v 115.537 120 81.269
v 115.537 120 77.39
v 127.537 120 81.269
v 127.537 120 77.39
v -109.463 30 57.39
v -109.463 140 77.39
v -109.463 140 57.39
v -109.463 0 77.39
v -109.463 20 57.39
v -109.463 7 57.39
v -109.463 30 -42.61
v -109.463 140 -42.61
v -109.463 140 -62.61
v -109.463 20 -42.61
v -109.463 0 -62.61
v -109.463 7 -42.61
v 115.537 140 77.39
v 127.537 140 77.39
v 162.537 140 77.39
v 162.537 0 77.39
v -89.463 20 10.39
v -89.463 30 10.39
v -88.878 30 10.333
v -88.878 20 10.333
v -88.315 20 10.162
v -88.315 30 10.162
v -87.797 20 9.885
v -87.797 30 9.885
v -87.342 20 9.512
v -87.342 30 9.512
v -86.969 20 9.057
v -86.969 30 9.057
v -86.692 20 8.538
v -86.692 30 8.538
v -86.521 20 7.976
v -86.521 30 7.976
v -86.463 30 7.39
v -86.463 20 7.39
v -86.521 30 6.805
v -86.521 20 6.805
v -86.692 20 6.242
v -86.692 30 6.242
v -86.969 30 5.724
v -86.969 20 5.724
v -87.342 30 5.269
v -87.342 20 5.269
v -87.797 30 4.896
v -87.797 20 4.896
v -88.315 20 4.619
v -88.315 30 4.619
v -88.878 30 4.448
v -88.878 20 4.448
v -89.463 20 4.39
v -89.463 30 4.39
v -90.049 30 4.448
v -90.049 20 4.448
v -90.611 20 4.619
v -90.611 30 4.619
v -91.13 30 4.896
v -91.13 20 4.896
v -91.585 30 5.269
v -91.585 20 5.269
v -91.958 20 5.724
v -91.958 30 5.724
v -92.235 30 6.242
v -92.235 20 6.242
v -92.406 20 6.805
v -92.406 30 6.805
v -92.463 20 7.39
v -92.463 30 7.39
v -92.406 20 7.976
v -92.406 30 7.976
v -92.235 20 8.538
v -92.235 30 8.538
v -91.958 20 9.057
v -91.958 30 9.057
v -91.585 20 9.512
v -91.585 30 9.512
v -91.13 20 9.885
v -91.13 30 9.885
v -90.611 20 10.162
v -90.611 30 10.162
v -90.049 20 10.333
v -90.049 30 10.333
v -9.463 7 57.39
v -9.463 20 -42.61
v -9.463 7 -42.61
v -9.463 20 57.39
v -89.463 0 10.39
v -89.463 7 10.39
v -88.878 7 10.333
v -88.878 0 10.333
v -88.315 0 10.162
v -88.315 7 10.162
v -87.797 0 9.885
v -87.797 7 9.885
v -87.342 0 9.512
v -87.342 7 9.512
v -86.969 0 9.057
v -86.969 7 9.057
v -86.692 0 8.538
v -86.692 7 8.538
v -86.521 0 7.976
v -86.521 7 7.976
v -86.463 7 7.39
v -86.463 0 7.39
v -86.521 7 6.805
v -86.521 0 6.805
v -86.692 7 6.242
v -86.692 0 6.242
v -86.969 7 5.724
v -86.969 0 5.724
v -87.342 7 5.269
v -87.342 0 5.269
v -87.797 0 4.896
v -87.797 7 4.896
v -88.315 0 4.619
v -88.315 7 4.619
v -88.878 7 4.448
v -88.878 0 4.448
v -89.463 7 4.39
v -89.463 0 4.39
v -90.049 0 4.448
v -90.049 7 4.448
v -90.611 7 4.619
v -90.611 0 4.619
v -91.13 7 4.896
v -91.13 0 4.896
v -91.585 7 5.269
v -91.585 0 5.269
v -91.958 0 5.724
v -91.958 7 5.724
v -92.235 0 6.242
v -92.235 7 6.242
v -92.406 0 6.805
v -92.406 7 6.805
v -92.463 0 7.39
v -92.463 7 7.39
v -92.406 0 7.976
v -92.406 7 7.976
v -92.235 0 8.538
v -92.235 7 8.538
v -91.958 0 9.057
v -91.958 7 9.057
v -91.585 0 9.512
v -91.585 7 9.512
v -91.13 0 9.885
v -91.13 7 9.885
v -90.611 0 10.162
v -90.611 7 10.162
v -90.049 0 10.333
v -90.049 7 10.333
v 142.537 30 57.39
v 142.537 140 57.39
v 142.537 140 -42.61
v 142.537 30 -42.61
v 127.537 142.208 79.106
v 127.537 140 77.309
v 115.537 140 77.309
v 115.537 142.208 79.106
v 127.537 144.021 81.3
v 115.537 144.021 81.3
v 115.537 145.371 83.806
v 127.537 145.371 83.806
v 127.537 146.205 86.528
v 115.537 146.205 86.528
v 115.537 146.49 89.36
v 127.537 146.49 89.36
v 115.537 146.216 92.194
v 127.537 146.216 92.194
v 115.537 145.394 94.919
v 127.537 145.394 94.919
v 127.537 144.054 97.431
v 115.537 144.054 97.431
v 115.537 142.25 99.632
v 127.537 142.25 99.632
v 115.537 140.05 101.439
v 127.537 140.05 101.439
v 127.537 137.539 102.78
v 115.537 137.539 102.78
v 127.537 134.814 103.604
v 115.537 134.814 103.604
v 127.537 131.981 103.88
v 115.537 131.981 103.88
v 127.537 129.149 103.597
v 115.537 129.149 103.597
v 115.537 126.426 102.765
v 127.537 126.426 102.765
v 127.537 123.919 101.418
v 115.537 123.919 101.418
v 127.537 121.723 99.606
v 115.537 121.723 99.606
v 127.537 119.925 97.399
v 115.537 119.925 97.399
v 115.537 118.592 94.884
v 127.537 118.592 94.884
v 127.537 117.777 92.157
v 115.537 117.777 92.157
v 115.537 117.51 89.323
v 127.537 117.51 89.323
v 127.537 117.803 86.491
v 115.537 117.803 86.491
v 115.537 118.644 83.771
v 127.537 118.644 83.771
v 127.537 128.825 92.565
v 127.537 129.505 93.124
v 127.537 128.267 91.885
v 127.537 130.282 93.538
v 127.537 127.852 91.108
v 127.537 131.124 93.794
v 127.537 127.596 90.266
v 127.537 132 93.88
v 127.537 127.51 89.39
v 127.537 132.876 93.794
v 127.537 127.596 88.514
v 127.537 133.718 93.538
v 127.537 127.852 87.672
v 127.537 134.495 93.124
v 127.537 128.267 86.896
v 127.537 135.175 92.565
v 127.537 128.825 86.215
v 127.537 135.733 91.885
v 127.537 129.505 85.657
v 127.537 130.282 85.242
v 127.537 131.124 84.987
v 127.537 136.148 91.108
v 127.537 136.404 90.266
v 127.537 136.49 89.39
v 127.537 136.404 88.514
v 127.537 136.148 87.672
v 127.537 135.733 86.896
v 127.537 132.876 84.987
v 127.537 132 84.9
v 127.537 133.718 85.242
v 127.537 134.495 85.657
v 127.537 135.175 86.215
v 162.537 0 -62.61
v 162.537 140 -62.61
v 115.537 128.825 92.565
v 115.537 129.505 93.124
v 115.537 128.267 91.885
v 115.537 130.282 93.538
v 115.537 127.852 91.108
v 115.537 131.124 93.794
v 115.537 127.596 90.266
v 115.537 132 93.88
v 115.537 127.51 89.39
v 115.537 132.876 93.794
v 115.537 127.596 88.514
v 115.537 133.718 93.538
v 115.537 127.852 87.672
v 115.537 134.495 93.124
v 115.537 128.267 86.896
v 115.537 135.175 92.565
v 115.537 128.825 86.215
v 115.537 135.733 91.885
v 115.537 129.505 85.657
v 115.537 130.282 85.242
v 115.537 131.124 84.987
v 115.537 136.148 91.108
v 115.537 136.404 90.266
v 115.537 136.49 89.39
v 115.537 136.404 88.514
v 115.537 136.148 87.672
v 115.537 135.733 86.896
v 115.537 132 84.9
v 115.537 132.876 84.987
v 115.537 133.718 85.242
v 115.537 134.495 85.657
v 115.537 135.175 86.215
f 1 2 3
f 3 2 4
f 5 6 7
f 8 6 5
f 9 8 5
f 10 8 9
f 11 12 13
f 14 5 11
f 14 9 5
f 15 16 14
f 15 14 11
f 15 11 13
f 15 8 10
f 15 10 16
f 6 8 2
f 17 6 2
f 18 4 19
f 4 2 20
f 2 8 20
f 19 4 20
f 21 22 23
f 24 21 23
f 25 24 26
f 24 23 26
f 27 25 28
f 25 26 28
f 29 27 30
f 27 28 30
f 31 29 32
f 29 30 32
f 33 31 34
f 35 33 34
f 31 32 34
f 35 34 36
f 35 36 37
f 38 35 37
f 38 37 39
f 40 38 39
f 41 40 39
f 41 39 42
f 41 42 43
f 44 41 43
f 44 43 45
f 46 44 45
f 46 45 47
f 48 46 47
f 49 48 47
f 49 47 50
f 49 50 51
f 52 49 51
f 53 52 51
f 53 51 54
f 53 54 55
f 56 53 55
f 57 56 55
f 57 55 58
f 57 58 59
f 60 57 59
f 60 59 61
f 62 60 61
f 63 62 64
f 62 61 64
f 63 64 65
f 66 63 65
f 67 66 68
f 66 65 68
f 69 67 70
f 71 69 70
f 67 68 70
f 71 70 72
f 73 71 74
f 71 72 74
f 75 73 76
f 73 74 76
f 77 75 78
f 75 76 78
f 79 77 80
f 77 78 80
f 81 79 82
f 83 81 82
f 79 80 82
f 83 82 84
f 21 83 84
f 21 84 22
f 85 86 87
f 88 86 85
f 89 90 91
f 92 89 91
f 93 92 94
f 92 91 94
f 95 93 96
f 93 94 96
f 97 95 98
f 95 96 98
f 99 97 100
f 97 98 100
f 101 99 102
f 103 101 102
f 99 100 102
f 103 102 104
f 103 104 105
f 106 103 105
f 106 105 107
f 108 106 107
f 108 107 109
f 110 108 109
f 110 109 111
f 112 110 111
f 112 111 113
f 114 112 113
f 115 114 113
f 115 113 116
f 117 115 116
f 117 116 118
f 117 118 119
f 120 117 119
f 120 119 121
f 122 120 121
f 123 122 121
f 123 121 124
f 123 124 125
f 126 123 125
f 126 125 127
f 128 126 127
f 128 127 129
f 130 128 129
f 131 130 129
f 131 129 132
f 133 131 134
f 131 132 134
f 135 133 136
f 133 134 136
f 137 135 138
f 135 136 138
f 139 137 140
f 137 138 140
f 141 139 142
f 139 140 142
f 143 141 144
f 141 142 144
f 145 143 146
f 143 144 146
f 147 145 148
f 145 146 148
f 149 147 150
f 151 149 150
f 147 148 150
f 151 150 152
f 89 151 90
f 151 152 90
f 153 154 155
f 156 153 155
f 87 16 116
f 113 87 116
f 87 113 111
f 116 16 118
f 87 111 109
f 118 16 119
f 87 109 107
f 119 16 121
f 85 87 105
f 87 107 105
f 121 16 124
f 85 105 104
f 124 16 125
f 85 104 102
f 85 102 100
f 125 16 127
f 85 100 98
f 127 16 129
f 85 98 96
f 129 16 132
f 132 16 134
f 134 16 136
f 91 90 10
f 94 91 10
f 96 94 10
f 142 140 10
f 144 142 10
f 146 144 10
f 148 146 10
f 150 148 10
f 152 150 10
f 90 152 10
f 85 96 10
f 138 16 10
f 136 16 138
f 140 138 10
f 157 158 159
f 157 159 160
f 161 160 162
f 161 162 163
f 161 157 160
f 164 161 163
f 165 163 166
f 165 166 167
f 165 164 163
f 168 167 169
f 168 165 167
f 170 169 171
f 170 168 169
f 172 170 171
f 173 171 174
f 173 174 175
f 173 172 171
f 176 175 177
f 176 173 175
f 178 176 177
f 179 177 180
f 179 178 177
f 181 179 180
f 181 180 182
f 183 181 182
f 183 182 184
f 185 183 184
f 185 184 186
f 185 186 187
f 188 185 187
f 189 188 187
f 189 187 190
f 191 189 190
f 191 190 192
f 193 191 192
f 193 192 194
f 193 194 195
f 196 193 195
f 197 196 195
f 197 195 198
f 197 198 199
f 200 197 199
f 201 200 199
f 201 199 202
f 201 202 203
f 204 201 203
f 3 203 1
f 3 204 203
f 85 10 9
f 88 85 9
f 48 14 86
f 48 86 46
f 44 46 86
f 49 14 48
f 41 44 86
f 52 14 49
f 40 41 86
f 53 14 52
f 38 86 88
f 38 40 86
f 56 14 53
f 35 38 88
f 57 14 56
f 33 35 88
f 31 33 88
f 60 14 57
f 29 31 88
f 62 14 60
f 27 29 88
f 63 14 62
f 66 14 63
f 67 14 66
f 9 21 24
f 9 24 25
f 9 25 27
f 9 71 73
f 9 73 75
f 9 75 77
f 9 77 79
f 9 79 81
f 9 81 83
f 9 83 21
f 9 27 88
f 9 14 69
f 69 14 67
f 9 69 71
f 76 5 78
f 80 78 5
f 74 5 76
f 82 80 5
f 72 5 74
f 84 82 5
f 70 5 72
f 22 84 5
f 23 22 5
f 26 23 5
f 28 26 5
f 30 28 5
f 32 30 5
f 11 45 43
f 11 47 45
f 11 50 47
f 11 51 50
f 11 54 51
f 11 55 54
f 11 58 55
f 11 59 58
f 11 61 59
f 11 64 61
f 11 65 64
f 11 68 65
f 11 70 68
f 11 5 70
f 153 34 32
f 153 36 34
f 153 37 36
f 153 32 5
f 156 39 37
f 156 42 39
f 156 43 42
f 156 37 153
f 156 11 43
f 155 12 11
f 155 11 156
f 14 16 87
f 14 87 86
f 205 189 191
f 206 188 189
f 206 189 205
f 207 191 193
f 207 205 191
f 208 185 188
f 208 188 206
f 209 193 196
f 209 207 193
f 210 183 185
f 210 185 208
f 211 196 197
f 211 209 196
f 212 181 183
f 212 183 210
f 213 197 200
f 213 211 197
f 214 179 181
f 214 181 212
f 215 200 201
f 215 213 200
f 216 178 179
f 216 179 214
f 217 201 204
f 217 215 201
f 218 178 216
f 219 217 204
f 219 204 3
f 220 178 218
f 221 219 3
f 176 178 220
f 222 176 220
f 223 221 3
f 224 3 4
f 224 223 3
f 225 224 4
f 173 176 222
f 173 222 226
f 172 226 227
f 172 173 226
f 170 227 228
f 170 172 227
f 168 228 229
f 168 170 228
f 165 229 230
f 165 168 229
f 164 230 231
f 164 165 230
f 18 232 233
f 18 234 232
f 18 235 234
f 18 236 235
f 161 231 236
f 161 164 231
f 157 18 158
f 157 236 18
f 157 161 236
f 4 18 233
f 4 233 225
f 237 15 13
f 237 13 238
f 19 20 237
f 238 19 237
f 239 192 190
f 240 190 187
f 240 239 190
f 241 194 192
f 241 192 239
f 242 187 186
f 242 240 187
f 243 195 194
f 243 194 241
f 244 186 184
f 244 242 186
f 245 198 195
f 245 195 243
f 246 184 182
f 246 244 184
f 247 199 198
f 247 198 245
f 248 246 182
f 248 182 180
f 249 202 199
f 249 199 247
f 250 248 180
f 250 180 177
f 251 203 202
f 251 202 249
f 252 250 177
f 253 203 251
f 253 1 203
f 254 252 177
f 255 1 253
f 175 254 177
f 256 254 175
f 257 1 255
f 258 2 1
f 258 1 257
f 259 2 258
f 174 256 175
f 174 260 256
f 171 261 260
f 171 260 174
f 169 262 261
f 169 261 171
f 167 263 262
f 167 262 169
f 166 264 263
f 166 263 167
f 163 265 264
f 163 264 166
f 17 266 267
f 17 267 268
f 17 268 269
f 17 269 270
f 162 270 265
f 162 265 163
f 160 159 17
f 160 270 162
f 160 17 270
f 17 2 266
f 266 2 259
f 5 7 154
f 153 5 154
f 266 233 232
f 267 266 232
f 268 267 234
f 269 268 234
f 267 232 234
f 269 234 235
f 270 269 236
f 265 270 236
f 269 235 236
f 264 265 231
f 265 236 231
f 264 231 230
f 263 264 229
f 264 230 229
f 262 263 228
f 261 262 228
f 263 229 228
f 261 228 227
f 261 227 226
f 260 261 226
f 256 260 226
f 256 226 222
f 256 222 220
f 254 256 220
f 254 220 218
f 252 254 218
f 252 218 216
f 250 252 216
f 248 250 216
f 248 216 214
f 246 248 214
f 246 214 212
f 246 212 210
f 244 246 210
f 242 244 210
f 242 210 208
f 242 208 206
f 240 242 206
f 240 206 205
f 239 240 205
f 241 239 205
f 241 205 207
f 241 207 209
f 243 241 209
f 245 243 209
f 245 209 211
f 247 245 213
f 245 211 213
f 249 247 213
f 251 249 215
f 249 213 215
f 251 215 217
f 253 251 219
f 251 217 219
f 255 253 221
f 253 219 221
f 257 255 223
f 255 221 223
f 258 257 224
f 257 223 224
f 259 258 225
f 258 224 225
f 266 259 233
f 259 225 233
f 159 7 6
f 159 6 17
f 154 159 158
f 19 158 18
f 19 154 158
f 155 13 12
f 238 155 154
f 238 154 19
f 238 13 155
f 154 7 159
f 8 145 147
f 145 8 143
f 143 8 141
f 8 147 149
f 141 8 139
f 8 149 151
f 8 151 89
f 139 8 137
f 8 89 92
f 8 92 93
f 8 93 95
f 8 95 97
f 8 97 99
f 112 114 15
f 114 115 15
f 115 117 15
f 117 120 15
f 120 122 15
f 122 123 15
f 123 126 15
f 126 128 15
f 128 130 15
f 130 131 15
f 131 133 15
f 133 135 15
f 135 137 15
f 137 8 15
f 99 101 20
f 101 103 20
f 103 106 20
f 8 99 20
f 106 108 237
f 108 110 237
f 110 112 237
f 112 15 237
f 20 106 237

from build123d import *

# Parameters (mm, degrees)
SKETCH_1_W          = 272
SKETCH_1_H          = 140
EXTRUDE_1_DEPTH     = 140
SKETCH_2_W          = 252
SKETCH_2_H          = 100
CUT_EXTRUDE_1_DEPTH = 110
SKETCH_3_W          = 100
SKETCH_3_H          = 13
CUT_EXTRUDE_2_DEPTH = 100
SKETCH_7_R          = 3
CUT_EXTRUDE_3_DEPTH = 211.967749748
SKETCH_8_W          = 12
SKETCH_8_H          = 12
EXTRUDE_2_DEPTH     = 10
SKETCH_9_R          = 14.49
SKETCH_9_R_2        = 4.49
EXTRUDE_1_2_DEPTH   = 12
SKETCH_11_R         = 4.49
CUT_EXTRUDE_5_DEPTH = 298.354040116


with BuildPart() as part:
    # 草圖1 → Extrude 1 (new body)
    with BuildSketch(Plane(origin=(0, 0, 0), x_dir=(1, 0, 0), z_dir=(0, 1, 0))):
        with Locations((26.536585366, -7.390243902)):
            Rectangle(SKETCH_1_W, SKETCH_1_H)
    extrude(amount=EXTRUDE_1_DEPTH)

    # 草圖2 → 除料-伸長1 (cut)
    with BuildSketch(Plane(origin=(0, 140, 0), x_dir=(1, 0, 0), z_dir=(0, 1, 0))):
        with Locations((16.536585366, -7.390243902)):
            Rectangle(SKETCH_2_W, SKETCH_2_H)
    extrude(amount=-CUT_EXTRUDE_1_DEPTH, mode=Mode.SUBTRACT)

    # 草圖3 → 除料-伸長2 (cut)
    with BuildSketch(Plane.ZY.offset(109.463414634)):
        with Locations((7.390243902, 13.5)):
            Rectangle(SKETCH_3_W, SKETCH_3_H)
    extrude(amount=-CUT_EXTRUDE_2_DEPTH, mode=Mode.SUBTRACT)

    # 草圖7 → 除料-伸長3 (cut, through all)
    with BuildSketch(Plane(origin=(0, 30, 0), x_dir=(1, 0, 0), z_dir=(0, 1, 0))):
        with Locations(Location((-89.463414634, -7.390243902, 0), (0, 0, 270))):
            Circle(SKETCH_7_R)
    extrude(amount=-CUT_EXTRUDE_3_DEPTH, mode=Mode.SUBTRACT)

    # 草圖8 → 填料-伸長2 (add)
    with BuildSketch(Plane.XY.offset(77.390243902)):
        with Locations((121.536585366, 126)):
            Rectangle(SKETCH_8_W, SKETCH_8_H)
    extrude(amount=EXTRUDE_2_DEPTH)

    # 草圖9 → Extrude 1 2 (add)
    with BuildSketch(Plane(origin=(127.536585366, 0, 0), x_dir=(0, 0, -1), z_dir=(1, 0, 0))):
        with Locations((-89.390243902, 132)):
            Circle(SKETCH_9_R)
        with Locations((-89.390243902, 132)):
            Circle(SKETCH_9_R_2, mode=Mode.SUBTRACT)
    extrude(amount=-EXTRUDE_1_2_DEPTH)

    # 草圖11 → 除料-伸長5 (cut, through all)
    with BuildSketch(Plane(origin=(127.536585366, 0, 0), x_dir=(0, 0, -1), z_dir=(1, 0, 0))):
        with Locations((-89.390243902, 132)):
            Circle(SKETCH_11_R)
    extrude(amount=-CUT_EXTRUDE_5_DEPTH, mode=Mode.SUBTRACT)


solid = part.part
